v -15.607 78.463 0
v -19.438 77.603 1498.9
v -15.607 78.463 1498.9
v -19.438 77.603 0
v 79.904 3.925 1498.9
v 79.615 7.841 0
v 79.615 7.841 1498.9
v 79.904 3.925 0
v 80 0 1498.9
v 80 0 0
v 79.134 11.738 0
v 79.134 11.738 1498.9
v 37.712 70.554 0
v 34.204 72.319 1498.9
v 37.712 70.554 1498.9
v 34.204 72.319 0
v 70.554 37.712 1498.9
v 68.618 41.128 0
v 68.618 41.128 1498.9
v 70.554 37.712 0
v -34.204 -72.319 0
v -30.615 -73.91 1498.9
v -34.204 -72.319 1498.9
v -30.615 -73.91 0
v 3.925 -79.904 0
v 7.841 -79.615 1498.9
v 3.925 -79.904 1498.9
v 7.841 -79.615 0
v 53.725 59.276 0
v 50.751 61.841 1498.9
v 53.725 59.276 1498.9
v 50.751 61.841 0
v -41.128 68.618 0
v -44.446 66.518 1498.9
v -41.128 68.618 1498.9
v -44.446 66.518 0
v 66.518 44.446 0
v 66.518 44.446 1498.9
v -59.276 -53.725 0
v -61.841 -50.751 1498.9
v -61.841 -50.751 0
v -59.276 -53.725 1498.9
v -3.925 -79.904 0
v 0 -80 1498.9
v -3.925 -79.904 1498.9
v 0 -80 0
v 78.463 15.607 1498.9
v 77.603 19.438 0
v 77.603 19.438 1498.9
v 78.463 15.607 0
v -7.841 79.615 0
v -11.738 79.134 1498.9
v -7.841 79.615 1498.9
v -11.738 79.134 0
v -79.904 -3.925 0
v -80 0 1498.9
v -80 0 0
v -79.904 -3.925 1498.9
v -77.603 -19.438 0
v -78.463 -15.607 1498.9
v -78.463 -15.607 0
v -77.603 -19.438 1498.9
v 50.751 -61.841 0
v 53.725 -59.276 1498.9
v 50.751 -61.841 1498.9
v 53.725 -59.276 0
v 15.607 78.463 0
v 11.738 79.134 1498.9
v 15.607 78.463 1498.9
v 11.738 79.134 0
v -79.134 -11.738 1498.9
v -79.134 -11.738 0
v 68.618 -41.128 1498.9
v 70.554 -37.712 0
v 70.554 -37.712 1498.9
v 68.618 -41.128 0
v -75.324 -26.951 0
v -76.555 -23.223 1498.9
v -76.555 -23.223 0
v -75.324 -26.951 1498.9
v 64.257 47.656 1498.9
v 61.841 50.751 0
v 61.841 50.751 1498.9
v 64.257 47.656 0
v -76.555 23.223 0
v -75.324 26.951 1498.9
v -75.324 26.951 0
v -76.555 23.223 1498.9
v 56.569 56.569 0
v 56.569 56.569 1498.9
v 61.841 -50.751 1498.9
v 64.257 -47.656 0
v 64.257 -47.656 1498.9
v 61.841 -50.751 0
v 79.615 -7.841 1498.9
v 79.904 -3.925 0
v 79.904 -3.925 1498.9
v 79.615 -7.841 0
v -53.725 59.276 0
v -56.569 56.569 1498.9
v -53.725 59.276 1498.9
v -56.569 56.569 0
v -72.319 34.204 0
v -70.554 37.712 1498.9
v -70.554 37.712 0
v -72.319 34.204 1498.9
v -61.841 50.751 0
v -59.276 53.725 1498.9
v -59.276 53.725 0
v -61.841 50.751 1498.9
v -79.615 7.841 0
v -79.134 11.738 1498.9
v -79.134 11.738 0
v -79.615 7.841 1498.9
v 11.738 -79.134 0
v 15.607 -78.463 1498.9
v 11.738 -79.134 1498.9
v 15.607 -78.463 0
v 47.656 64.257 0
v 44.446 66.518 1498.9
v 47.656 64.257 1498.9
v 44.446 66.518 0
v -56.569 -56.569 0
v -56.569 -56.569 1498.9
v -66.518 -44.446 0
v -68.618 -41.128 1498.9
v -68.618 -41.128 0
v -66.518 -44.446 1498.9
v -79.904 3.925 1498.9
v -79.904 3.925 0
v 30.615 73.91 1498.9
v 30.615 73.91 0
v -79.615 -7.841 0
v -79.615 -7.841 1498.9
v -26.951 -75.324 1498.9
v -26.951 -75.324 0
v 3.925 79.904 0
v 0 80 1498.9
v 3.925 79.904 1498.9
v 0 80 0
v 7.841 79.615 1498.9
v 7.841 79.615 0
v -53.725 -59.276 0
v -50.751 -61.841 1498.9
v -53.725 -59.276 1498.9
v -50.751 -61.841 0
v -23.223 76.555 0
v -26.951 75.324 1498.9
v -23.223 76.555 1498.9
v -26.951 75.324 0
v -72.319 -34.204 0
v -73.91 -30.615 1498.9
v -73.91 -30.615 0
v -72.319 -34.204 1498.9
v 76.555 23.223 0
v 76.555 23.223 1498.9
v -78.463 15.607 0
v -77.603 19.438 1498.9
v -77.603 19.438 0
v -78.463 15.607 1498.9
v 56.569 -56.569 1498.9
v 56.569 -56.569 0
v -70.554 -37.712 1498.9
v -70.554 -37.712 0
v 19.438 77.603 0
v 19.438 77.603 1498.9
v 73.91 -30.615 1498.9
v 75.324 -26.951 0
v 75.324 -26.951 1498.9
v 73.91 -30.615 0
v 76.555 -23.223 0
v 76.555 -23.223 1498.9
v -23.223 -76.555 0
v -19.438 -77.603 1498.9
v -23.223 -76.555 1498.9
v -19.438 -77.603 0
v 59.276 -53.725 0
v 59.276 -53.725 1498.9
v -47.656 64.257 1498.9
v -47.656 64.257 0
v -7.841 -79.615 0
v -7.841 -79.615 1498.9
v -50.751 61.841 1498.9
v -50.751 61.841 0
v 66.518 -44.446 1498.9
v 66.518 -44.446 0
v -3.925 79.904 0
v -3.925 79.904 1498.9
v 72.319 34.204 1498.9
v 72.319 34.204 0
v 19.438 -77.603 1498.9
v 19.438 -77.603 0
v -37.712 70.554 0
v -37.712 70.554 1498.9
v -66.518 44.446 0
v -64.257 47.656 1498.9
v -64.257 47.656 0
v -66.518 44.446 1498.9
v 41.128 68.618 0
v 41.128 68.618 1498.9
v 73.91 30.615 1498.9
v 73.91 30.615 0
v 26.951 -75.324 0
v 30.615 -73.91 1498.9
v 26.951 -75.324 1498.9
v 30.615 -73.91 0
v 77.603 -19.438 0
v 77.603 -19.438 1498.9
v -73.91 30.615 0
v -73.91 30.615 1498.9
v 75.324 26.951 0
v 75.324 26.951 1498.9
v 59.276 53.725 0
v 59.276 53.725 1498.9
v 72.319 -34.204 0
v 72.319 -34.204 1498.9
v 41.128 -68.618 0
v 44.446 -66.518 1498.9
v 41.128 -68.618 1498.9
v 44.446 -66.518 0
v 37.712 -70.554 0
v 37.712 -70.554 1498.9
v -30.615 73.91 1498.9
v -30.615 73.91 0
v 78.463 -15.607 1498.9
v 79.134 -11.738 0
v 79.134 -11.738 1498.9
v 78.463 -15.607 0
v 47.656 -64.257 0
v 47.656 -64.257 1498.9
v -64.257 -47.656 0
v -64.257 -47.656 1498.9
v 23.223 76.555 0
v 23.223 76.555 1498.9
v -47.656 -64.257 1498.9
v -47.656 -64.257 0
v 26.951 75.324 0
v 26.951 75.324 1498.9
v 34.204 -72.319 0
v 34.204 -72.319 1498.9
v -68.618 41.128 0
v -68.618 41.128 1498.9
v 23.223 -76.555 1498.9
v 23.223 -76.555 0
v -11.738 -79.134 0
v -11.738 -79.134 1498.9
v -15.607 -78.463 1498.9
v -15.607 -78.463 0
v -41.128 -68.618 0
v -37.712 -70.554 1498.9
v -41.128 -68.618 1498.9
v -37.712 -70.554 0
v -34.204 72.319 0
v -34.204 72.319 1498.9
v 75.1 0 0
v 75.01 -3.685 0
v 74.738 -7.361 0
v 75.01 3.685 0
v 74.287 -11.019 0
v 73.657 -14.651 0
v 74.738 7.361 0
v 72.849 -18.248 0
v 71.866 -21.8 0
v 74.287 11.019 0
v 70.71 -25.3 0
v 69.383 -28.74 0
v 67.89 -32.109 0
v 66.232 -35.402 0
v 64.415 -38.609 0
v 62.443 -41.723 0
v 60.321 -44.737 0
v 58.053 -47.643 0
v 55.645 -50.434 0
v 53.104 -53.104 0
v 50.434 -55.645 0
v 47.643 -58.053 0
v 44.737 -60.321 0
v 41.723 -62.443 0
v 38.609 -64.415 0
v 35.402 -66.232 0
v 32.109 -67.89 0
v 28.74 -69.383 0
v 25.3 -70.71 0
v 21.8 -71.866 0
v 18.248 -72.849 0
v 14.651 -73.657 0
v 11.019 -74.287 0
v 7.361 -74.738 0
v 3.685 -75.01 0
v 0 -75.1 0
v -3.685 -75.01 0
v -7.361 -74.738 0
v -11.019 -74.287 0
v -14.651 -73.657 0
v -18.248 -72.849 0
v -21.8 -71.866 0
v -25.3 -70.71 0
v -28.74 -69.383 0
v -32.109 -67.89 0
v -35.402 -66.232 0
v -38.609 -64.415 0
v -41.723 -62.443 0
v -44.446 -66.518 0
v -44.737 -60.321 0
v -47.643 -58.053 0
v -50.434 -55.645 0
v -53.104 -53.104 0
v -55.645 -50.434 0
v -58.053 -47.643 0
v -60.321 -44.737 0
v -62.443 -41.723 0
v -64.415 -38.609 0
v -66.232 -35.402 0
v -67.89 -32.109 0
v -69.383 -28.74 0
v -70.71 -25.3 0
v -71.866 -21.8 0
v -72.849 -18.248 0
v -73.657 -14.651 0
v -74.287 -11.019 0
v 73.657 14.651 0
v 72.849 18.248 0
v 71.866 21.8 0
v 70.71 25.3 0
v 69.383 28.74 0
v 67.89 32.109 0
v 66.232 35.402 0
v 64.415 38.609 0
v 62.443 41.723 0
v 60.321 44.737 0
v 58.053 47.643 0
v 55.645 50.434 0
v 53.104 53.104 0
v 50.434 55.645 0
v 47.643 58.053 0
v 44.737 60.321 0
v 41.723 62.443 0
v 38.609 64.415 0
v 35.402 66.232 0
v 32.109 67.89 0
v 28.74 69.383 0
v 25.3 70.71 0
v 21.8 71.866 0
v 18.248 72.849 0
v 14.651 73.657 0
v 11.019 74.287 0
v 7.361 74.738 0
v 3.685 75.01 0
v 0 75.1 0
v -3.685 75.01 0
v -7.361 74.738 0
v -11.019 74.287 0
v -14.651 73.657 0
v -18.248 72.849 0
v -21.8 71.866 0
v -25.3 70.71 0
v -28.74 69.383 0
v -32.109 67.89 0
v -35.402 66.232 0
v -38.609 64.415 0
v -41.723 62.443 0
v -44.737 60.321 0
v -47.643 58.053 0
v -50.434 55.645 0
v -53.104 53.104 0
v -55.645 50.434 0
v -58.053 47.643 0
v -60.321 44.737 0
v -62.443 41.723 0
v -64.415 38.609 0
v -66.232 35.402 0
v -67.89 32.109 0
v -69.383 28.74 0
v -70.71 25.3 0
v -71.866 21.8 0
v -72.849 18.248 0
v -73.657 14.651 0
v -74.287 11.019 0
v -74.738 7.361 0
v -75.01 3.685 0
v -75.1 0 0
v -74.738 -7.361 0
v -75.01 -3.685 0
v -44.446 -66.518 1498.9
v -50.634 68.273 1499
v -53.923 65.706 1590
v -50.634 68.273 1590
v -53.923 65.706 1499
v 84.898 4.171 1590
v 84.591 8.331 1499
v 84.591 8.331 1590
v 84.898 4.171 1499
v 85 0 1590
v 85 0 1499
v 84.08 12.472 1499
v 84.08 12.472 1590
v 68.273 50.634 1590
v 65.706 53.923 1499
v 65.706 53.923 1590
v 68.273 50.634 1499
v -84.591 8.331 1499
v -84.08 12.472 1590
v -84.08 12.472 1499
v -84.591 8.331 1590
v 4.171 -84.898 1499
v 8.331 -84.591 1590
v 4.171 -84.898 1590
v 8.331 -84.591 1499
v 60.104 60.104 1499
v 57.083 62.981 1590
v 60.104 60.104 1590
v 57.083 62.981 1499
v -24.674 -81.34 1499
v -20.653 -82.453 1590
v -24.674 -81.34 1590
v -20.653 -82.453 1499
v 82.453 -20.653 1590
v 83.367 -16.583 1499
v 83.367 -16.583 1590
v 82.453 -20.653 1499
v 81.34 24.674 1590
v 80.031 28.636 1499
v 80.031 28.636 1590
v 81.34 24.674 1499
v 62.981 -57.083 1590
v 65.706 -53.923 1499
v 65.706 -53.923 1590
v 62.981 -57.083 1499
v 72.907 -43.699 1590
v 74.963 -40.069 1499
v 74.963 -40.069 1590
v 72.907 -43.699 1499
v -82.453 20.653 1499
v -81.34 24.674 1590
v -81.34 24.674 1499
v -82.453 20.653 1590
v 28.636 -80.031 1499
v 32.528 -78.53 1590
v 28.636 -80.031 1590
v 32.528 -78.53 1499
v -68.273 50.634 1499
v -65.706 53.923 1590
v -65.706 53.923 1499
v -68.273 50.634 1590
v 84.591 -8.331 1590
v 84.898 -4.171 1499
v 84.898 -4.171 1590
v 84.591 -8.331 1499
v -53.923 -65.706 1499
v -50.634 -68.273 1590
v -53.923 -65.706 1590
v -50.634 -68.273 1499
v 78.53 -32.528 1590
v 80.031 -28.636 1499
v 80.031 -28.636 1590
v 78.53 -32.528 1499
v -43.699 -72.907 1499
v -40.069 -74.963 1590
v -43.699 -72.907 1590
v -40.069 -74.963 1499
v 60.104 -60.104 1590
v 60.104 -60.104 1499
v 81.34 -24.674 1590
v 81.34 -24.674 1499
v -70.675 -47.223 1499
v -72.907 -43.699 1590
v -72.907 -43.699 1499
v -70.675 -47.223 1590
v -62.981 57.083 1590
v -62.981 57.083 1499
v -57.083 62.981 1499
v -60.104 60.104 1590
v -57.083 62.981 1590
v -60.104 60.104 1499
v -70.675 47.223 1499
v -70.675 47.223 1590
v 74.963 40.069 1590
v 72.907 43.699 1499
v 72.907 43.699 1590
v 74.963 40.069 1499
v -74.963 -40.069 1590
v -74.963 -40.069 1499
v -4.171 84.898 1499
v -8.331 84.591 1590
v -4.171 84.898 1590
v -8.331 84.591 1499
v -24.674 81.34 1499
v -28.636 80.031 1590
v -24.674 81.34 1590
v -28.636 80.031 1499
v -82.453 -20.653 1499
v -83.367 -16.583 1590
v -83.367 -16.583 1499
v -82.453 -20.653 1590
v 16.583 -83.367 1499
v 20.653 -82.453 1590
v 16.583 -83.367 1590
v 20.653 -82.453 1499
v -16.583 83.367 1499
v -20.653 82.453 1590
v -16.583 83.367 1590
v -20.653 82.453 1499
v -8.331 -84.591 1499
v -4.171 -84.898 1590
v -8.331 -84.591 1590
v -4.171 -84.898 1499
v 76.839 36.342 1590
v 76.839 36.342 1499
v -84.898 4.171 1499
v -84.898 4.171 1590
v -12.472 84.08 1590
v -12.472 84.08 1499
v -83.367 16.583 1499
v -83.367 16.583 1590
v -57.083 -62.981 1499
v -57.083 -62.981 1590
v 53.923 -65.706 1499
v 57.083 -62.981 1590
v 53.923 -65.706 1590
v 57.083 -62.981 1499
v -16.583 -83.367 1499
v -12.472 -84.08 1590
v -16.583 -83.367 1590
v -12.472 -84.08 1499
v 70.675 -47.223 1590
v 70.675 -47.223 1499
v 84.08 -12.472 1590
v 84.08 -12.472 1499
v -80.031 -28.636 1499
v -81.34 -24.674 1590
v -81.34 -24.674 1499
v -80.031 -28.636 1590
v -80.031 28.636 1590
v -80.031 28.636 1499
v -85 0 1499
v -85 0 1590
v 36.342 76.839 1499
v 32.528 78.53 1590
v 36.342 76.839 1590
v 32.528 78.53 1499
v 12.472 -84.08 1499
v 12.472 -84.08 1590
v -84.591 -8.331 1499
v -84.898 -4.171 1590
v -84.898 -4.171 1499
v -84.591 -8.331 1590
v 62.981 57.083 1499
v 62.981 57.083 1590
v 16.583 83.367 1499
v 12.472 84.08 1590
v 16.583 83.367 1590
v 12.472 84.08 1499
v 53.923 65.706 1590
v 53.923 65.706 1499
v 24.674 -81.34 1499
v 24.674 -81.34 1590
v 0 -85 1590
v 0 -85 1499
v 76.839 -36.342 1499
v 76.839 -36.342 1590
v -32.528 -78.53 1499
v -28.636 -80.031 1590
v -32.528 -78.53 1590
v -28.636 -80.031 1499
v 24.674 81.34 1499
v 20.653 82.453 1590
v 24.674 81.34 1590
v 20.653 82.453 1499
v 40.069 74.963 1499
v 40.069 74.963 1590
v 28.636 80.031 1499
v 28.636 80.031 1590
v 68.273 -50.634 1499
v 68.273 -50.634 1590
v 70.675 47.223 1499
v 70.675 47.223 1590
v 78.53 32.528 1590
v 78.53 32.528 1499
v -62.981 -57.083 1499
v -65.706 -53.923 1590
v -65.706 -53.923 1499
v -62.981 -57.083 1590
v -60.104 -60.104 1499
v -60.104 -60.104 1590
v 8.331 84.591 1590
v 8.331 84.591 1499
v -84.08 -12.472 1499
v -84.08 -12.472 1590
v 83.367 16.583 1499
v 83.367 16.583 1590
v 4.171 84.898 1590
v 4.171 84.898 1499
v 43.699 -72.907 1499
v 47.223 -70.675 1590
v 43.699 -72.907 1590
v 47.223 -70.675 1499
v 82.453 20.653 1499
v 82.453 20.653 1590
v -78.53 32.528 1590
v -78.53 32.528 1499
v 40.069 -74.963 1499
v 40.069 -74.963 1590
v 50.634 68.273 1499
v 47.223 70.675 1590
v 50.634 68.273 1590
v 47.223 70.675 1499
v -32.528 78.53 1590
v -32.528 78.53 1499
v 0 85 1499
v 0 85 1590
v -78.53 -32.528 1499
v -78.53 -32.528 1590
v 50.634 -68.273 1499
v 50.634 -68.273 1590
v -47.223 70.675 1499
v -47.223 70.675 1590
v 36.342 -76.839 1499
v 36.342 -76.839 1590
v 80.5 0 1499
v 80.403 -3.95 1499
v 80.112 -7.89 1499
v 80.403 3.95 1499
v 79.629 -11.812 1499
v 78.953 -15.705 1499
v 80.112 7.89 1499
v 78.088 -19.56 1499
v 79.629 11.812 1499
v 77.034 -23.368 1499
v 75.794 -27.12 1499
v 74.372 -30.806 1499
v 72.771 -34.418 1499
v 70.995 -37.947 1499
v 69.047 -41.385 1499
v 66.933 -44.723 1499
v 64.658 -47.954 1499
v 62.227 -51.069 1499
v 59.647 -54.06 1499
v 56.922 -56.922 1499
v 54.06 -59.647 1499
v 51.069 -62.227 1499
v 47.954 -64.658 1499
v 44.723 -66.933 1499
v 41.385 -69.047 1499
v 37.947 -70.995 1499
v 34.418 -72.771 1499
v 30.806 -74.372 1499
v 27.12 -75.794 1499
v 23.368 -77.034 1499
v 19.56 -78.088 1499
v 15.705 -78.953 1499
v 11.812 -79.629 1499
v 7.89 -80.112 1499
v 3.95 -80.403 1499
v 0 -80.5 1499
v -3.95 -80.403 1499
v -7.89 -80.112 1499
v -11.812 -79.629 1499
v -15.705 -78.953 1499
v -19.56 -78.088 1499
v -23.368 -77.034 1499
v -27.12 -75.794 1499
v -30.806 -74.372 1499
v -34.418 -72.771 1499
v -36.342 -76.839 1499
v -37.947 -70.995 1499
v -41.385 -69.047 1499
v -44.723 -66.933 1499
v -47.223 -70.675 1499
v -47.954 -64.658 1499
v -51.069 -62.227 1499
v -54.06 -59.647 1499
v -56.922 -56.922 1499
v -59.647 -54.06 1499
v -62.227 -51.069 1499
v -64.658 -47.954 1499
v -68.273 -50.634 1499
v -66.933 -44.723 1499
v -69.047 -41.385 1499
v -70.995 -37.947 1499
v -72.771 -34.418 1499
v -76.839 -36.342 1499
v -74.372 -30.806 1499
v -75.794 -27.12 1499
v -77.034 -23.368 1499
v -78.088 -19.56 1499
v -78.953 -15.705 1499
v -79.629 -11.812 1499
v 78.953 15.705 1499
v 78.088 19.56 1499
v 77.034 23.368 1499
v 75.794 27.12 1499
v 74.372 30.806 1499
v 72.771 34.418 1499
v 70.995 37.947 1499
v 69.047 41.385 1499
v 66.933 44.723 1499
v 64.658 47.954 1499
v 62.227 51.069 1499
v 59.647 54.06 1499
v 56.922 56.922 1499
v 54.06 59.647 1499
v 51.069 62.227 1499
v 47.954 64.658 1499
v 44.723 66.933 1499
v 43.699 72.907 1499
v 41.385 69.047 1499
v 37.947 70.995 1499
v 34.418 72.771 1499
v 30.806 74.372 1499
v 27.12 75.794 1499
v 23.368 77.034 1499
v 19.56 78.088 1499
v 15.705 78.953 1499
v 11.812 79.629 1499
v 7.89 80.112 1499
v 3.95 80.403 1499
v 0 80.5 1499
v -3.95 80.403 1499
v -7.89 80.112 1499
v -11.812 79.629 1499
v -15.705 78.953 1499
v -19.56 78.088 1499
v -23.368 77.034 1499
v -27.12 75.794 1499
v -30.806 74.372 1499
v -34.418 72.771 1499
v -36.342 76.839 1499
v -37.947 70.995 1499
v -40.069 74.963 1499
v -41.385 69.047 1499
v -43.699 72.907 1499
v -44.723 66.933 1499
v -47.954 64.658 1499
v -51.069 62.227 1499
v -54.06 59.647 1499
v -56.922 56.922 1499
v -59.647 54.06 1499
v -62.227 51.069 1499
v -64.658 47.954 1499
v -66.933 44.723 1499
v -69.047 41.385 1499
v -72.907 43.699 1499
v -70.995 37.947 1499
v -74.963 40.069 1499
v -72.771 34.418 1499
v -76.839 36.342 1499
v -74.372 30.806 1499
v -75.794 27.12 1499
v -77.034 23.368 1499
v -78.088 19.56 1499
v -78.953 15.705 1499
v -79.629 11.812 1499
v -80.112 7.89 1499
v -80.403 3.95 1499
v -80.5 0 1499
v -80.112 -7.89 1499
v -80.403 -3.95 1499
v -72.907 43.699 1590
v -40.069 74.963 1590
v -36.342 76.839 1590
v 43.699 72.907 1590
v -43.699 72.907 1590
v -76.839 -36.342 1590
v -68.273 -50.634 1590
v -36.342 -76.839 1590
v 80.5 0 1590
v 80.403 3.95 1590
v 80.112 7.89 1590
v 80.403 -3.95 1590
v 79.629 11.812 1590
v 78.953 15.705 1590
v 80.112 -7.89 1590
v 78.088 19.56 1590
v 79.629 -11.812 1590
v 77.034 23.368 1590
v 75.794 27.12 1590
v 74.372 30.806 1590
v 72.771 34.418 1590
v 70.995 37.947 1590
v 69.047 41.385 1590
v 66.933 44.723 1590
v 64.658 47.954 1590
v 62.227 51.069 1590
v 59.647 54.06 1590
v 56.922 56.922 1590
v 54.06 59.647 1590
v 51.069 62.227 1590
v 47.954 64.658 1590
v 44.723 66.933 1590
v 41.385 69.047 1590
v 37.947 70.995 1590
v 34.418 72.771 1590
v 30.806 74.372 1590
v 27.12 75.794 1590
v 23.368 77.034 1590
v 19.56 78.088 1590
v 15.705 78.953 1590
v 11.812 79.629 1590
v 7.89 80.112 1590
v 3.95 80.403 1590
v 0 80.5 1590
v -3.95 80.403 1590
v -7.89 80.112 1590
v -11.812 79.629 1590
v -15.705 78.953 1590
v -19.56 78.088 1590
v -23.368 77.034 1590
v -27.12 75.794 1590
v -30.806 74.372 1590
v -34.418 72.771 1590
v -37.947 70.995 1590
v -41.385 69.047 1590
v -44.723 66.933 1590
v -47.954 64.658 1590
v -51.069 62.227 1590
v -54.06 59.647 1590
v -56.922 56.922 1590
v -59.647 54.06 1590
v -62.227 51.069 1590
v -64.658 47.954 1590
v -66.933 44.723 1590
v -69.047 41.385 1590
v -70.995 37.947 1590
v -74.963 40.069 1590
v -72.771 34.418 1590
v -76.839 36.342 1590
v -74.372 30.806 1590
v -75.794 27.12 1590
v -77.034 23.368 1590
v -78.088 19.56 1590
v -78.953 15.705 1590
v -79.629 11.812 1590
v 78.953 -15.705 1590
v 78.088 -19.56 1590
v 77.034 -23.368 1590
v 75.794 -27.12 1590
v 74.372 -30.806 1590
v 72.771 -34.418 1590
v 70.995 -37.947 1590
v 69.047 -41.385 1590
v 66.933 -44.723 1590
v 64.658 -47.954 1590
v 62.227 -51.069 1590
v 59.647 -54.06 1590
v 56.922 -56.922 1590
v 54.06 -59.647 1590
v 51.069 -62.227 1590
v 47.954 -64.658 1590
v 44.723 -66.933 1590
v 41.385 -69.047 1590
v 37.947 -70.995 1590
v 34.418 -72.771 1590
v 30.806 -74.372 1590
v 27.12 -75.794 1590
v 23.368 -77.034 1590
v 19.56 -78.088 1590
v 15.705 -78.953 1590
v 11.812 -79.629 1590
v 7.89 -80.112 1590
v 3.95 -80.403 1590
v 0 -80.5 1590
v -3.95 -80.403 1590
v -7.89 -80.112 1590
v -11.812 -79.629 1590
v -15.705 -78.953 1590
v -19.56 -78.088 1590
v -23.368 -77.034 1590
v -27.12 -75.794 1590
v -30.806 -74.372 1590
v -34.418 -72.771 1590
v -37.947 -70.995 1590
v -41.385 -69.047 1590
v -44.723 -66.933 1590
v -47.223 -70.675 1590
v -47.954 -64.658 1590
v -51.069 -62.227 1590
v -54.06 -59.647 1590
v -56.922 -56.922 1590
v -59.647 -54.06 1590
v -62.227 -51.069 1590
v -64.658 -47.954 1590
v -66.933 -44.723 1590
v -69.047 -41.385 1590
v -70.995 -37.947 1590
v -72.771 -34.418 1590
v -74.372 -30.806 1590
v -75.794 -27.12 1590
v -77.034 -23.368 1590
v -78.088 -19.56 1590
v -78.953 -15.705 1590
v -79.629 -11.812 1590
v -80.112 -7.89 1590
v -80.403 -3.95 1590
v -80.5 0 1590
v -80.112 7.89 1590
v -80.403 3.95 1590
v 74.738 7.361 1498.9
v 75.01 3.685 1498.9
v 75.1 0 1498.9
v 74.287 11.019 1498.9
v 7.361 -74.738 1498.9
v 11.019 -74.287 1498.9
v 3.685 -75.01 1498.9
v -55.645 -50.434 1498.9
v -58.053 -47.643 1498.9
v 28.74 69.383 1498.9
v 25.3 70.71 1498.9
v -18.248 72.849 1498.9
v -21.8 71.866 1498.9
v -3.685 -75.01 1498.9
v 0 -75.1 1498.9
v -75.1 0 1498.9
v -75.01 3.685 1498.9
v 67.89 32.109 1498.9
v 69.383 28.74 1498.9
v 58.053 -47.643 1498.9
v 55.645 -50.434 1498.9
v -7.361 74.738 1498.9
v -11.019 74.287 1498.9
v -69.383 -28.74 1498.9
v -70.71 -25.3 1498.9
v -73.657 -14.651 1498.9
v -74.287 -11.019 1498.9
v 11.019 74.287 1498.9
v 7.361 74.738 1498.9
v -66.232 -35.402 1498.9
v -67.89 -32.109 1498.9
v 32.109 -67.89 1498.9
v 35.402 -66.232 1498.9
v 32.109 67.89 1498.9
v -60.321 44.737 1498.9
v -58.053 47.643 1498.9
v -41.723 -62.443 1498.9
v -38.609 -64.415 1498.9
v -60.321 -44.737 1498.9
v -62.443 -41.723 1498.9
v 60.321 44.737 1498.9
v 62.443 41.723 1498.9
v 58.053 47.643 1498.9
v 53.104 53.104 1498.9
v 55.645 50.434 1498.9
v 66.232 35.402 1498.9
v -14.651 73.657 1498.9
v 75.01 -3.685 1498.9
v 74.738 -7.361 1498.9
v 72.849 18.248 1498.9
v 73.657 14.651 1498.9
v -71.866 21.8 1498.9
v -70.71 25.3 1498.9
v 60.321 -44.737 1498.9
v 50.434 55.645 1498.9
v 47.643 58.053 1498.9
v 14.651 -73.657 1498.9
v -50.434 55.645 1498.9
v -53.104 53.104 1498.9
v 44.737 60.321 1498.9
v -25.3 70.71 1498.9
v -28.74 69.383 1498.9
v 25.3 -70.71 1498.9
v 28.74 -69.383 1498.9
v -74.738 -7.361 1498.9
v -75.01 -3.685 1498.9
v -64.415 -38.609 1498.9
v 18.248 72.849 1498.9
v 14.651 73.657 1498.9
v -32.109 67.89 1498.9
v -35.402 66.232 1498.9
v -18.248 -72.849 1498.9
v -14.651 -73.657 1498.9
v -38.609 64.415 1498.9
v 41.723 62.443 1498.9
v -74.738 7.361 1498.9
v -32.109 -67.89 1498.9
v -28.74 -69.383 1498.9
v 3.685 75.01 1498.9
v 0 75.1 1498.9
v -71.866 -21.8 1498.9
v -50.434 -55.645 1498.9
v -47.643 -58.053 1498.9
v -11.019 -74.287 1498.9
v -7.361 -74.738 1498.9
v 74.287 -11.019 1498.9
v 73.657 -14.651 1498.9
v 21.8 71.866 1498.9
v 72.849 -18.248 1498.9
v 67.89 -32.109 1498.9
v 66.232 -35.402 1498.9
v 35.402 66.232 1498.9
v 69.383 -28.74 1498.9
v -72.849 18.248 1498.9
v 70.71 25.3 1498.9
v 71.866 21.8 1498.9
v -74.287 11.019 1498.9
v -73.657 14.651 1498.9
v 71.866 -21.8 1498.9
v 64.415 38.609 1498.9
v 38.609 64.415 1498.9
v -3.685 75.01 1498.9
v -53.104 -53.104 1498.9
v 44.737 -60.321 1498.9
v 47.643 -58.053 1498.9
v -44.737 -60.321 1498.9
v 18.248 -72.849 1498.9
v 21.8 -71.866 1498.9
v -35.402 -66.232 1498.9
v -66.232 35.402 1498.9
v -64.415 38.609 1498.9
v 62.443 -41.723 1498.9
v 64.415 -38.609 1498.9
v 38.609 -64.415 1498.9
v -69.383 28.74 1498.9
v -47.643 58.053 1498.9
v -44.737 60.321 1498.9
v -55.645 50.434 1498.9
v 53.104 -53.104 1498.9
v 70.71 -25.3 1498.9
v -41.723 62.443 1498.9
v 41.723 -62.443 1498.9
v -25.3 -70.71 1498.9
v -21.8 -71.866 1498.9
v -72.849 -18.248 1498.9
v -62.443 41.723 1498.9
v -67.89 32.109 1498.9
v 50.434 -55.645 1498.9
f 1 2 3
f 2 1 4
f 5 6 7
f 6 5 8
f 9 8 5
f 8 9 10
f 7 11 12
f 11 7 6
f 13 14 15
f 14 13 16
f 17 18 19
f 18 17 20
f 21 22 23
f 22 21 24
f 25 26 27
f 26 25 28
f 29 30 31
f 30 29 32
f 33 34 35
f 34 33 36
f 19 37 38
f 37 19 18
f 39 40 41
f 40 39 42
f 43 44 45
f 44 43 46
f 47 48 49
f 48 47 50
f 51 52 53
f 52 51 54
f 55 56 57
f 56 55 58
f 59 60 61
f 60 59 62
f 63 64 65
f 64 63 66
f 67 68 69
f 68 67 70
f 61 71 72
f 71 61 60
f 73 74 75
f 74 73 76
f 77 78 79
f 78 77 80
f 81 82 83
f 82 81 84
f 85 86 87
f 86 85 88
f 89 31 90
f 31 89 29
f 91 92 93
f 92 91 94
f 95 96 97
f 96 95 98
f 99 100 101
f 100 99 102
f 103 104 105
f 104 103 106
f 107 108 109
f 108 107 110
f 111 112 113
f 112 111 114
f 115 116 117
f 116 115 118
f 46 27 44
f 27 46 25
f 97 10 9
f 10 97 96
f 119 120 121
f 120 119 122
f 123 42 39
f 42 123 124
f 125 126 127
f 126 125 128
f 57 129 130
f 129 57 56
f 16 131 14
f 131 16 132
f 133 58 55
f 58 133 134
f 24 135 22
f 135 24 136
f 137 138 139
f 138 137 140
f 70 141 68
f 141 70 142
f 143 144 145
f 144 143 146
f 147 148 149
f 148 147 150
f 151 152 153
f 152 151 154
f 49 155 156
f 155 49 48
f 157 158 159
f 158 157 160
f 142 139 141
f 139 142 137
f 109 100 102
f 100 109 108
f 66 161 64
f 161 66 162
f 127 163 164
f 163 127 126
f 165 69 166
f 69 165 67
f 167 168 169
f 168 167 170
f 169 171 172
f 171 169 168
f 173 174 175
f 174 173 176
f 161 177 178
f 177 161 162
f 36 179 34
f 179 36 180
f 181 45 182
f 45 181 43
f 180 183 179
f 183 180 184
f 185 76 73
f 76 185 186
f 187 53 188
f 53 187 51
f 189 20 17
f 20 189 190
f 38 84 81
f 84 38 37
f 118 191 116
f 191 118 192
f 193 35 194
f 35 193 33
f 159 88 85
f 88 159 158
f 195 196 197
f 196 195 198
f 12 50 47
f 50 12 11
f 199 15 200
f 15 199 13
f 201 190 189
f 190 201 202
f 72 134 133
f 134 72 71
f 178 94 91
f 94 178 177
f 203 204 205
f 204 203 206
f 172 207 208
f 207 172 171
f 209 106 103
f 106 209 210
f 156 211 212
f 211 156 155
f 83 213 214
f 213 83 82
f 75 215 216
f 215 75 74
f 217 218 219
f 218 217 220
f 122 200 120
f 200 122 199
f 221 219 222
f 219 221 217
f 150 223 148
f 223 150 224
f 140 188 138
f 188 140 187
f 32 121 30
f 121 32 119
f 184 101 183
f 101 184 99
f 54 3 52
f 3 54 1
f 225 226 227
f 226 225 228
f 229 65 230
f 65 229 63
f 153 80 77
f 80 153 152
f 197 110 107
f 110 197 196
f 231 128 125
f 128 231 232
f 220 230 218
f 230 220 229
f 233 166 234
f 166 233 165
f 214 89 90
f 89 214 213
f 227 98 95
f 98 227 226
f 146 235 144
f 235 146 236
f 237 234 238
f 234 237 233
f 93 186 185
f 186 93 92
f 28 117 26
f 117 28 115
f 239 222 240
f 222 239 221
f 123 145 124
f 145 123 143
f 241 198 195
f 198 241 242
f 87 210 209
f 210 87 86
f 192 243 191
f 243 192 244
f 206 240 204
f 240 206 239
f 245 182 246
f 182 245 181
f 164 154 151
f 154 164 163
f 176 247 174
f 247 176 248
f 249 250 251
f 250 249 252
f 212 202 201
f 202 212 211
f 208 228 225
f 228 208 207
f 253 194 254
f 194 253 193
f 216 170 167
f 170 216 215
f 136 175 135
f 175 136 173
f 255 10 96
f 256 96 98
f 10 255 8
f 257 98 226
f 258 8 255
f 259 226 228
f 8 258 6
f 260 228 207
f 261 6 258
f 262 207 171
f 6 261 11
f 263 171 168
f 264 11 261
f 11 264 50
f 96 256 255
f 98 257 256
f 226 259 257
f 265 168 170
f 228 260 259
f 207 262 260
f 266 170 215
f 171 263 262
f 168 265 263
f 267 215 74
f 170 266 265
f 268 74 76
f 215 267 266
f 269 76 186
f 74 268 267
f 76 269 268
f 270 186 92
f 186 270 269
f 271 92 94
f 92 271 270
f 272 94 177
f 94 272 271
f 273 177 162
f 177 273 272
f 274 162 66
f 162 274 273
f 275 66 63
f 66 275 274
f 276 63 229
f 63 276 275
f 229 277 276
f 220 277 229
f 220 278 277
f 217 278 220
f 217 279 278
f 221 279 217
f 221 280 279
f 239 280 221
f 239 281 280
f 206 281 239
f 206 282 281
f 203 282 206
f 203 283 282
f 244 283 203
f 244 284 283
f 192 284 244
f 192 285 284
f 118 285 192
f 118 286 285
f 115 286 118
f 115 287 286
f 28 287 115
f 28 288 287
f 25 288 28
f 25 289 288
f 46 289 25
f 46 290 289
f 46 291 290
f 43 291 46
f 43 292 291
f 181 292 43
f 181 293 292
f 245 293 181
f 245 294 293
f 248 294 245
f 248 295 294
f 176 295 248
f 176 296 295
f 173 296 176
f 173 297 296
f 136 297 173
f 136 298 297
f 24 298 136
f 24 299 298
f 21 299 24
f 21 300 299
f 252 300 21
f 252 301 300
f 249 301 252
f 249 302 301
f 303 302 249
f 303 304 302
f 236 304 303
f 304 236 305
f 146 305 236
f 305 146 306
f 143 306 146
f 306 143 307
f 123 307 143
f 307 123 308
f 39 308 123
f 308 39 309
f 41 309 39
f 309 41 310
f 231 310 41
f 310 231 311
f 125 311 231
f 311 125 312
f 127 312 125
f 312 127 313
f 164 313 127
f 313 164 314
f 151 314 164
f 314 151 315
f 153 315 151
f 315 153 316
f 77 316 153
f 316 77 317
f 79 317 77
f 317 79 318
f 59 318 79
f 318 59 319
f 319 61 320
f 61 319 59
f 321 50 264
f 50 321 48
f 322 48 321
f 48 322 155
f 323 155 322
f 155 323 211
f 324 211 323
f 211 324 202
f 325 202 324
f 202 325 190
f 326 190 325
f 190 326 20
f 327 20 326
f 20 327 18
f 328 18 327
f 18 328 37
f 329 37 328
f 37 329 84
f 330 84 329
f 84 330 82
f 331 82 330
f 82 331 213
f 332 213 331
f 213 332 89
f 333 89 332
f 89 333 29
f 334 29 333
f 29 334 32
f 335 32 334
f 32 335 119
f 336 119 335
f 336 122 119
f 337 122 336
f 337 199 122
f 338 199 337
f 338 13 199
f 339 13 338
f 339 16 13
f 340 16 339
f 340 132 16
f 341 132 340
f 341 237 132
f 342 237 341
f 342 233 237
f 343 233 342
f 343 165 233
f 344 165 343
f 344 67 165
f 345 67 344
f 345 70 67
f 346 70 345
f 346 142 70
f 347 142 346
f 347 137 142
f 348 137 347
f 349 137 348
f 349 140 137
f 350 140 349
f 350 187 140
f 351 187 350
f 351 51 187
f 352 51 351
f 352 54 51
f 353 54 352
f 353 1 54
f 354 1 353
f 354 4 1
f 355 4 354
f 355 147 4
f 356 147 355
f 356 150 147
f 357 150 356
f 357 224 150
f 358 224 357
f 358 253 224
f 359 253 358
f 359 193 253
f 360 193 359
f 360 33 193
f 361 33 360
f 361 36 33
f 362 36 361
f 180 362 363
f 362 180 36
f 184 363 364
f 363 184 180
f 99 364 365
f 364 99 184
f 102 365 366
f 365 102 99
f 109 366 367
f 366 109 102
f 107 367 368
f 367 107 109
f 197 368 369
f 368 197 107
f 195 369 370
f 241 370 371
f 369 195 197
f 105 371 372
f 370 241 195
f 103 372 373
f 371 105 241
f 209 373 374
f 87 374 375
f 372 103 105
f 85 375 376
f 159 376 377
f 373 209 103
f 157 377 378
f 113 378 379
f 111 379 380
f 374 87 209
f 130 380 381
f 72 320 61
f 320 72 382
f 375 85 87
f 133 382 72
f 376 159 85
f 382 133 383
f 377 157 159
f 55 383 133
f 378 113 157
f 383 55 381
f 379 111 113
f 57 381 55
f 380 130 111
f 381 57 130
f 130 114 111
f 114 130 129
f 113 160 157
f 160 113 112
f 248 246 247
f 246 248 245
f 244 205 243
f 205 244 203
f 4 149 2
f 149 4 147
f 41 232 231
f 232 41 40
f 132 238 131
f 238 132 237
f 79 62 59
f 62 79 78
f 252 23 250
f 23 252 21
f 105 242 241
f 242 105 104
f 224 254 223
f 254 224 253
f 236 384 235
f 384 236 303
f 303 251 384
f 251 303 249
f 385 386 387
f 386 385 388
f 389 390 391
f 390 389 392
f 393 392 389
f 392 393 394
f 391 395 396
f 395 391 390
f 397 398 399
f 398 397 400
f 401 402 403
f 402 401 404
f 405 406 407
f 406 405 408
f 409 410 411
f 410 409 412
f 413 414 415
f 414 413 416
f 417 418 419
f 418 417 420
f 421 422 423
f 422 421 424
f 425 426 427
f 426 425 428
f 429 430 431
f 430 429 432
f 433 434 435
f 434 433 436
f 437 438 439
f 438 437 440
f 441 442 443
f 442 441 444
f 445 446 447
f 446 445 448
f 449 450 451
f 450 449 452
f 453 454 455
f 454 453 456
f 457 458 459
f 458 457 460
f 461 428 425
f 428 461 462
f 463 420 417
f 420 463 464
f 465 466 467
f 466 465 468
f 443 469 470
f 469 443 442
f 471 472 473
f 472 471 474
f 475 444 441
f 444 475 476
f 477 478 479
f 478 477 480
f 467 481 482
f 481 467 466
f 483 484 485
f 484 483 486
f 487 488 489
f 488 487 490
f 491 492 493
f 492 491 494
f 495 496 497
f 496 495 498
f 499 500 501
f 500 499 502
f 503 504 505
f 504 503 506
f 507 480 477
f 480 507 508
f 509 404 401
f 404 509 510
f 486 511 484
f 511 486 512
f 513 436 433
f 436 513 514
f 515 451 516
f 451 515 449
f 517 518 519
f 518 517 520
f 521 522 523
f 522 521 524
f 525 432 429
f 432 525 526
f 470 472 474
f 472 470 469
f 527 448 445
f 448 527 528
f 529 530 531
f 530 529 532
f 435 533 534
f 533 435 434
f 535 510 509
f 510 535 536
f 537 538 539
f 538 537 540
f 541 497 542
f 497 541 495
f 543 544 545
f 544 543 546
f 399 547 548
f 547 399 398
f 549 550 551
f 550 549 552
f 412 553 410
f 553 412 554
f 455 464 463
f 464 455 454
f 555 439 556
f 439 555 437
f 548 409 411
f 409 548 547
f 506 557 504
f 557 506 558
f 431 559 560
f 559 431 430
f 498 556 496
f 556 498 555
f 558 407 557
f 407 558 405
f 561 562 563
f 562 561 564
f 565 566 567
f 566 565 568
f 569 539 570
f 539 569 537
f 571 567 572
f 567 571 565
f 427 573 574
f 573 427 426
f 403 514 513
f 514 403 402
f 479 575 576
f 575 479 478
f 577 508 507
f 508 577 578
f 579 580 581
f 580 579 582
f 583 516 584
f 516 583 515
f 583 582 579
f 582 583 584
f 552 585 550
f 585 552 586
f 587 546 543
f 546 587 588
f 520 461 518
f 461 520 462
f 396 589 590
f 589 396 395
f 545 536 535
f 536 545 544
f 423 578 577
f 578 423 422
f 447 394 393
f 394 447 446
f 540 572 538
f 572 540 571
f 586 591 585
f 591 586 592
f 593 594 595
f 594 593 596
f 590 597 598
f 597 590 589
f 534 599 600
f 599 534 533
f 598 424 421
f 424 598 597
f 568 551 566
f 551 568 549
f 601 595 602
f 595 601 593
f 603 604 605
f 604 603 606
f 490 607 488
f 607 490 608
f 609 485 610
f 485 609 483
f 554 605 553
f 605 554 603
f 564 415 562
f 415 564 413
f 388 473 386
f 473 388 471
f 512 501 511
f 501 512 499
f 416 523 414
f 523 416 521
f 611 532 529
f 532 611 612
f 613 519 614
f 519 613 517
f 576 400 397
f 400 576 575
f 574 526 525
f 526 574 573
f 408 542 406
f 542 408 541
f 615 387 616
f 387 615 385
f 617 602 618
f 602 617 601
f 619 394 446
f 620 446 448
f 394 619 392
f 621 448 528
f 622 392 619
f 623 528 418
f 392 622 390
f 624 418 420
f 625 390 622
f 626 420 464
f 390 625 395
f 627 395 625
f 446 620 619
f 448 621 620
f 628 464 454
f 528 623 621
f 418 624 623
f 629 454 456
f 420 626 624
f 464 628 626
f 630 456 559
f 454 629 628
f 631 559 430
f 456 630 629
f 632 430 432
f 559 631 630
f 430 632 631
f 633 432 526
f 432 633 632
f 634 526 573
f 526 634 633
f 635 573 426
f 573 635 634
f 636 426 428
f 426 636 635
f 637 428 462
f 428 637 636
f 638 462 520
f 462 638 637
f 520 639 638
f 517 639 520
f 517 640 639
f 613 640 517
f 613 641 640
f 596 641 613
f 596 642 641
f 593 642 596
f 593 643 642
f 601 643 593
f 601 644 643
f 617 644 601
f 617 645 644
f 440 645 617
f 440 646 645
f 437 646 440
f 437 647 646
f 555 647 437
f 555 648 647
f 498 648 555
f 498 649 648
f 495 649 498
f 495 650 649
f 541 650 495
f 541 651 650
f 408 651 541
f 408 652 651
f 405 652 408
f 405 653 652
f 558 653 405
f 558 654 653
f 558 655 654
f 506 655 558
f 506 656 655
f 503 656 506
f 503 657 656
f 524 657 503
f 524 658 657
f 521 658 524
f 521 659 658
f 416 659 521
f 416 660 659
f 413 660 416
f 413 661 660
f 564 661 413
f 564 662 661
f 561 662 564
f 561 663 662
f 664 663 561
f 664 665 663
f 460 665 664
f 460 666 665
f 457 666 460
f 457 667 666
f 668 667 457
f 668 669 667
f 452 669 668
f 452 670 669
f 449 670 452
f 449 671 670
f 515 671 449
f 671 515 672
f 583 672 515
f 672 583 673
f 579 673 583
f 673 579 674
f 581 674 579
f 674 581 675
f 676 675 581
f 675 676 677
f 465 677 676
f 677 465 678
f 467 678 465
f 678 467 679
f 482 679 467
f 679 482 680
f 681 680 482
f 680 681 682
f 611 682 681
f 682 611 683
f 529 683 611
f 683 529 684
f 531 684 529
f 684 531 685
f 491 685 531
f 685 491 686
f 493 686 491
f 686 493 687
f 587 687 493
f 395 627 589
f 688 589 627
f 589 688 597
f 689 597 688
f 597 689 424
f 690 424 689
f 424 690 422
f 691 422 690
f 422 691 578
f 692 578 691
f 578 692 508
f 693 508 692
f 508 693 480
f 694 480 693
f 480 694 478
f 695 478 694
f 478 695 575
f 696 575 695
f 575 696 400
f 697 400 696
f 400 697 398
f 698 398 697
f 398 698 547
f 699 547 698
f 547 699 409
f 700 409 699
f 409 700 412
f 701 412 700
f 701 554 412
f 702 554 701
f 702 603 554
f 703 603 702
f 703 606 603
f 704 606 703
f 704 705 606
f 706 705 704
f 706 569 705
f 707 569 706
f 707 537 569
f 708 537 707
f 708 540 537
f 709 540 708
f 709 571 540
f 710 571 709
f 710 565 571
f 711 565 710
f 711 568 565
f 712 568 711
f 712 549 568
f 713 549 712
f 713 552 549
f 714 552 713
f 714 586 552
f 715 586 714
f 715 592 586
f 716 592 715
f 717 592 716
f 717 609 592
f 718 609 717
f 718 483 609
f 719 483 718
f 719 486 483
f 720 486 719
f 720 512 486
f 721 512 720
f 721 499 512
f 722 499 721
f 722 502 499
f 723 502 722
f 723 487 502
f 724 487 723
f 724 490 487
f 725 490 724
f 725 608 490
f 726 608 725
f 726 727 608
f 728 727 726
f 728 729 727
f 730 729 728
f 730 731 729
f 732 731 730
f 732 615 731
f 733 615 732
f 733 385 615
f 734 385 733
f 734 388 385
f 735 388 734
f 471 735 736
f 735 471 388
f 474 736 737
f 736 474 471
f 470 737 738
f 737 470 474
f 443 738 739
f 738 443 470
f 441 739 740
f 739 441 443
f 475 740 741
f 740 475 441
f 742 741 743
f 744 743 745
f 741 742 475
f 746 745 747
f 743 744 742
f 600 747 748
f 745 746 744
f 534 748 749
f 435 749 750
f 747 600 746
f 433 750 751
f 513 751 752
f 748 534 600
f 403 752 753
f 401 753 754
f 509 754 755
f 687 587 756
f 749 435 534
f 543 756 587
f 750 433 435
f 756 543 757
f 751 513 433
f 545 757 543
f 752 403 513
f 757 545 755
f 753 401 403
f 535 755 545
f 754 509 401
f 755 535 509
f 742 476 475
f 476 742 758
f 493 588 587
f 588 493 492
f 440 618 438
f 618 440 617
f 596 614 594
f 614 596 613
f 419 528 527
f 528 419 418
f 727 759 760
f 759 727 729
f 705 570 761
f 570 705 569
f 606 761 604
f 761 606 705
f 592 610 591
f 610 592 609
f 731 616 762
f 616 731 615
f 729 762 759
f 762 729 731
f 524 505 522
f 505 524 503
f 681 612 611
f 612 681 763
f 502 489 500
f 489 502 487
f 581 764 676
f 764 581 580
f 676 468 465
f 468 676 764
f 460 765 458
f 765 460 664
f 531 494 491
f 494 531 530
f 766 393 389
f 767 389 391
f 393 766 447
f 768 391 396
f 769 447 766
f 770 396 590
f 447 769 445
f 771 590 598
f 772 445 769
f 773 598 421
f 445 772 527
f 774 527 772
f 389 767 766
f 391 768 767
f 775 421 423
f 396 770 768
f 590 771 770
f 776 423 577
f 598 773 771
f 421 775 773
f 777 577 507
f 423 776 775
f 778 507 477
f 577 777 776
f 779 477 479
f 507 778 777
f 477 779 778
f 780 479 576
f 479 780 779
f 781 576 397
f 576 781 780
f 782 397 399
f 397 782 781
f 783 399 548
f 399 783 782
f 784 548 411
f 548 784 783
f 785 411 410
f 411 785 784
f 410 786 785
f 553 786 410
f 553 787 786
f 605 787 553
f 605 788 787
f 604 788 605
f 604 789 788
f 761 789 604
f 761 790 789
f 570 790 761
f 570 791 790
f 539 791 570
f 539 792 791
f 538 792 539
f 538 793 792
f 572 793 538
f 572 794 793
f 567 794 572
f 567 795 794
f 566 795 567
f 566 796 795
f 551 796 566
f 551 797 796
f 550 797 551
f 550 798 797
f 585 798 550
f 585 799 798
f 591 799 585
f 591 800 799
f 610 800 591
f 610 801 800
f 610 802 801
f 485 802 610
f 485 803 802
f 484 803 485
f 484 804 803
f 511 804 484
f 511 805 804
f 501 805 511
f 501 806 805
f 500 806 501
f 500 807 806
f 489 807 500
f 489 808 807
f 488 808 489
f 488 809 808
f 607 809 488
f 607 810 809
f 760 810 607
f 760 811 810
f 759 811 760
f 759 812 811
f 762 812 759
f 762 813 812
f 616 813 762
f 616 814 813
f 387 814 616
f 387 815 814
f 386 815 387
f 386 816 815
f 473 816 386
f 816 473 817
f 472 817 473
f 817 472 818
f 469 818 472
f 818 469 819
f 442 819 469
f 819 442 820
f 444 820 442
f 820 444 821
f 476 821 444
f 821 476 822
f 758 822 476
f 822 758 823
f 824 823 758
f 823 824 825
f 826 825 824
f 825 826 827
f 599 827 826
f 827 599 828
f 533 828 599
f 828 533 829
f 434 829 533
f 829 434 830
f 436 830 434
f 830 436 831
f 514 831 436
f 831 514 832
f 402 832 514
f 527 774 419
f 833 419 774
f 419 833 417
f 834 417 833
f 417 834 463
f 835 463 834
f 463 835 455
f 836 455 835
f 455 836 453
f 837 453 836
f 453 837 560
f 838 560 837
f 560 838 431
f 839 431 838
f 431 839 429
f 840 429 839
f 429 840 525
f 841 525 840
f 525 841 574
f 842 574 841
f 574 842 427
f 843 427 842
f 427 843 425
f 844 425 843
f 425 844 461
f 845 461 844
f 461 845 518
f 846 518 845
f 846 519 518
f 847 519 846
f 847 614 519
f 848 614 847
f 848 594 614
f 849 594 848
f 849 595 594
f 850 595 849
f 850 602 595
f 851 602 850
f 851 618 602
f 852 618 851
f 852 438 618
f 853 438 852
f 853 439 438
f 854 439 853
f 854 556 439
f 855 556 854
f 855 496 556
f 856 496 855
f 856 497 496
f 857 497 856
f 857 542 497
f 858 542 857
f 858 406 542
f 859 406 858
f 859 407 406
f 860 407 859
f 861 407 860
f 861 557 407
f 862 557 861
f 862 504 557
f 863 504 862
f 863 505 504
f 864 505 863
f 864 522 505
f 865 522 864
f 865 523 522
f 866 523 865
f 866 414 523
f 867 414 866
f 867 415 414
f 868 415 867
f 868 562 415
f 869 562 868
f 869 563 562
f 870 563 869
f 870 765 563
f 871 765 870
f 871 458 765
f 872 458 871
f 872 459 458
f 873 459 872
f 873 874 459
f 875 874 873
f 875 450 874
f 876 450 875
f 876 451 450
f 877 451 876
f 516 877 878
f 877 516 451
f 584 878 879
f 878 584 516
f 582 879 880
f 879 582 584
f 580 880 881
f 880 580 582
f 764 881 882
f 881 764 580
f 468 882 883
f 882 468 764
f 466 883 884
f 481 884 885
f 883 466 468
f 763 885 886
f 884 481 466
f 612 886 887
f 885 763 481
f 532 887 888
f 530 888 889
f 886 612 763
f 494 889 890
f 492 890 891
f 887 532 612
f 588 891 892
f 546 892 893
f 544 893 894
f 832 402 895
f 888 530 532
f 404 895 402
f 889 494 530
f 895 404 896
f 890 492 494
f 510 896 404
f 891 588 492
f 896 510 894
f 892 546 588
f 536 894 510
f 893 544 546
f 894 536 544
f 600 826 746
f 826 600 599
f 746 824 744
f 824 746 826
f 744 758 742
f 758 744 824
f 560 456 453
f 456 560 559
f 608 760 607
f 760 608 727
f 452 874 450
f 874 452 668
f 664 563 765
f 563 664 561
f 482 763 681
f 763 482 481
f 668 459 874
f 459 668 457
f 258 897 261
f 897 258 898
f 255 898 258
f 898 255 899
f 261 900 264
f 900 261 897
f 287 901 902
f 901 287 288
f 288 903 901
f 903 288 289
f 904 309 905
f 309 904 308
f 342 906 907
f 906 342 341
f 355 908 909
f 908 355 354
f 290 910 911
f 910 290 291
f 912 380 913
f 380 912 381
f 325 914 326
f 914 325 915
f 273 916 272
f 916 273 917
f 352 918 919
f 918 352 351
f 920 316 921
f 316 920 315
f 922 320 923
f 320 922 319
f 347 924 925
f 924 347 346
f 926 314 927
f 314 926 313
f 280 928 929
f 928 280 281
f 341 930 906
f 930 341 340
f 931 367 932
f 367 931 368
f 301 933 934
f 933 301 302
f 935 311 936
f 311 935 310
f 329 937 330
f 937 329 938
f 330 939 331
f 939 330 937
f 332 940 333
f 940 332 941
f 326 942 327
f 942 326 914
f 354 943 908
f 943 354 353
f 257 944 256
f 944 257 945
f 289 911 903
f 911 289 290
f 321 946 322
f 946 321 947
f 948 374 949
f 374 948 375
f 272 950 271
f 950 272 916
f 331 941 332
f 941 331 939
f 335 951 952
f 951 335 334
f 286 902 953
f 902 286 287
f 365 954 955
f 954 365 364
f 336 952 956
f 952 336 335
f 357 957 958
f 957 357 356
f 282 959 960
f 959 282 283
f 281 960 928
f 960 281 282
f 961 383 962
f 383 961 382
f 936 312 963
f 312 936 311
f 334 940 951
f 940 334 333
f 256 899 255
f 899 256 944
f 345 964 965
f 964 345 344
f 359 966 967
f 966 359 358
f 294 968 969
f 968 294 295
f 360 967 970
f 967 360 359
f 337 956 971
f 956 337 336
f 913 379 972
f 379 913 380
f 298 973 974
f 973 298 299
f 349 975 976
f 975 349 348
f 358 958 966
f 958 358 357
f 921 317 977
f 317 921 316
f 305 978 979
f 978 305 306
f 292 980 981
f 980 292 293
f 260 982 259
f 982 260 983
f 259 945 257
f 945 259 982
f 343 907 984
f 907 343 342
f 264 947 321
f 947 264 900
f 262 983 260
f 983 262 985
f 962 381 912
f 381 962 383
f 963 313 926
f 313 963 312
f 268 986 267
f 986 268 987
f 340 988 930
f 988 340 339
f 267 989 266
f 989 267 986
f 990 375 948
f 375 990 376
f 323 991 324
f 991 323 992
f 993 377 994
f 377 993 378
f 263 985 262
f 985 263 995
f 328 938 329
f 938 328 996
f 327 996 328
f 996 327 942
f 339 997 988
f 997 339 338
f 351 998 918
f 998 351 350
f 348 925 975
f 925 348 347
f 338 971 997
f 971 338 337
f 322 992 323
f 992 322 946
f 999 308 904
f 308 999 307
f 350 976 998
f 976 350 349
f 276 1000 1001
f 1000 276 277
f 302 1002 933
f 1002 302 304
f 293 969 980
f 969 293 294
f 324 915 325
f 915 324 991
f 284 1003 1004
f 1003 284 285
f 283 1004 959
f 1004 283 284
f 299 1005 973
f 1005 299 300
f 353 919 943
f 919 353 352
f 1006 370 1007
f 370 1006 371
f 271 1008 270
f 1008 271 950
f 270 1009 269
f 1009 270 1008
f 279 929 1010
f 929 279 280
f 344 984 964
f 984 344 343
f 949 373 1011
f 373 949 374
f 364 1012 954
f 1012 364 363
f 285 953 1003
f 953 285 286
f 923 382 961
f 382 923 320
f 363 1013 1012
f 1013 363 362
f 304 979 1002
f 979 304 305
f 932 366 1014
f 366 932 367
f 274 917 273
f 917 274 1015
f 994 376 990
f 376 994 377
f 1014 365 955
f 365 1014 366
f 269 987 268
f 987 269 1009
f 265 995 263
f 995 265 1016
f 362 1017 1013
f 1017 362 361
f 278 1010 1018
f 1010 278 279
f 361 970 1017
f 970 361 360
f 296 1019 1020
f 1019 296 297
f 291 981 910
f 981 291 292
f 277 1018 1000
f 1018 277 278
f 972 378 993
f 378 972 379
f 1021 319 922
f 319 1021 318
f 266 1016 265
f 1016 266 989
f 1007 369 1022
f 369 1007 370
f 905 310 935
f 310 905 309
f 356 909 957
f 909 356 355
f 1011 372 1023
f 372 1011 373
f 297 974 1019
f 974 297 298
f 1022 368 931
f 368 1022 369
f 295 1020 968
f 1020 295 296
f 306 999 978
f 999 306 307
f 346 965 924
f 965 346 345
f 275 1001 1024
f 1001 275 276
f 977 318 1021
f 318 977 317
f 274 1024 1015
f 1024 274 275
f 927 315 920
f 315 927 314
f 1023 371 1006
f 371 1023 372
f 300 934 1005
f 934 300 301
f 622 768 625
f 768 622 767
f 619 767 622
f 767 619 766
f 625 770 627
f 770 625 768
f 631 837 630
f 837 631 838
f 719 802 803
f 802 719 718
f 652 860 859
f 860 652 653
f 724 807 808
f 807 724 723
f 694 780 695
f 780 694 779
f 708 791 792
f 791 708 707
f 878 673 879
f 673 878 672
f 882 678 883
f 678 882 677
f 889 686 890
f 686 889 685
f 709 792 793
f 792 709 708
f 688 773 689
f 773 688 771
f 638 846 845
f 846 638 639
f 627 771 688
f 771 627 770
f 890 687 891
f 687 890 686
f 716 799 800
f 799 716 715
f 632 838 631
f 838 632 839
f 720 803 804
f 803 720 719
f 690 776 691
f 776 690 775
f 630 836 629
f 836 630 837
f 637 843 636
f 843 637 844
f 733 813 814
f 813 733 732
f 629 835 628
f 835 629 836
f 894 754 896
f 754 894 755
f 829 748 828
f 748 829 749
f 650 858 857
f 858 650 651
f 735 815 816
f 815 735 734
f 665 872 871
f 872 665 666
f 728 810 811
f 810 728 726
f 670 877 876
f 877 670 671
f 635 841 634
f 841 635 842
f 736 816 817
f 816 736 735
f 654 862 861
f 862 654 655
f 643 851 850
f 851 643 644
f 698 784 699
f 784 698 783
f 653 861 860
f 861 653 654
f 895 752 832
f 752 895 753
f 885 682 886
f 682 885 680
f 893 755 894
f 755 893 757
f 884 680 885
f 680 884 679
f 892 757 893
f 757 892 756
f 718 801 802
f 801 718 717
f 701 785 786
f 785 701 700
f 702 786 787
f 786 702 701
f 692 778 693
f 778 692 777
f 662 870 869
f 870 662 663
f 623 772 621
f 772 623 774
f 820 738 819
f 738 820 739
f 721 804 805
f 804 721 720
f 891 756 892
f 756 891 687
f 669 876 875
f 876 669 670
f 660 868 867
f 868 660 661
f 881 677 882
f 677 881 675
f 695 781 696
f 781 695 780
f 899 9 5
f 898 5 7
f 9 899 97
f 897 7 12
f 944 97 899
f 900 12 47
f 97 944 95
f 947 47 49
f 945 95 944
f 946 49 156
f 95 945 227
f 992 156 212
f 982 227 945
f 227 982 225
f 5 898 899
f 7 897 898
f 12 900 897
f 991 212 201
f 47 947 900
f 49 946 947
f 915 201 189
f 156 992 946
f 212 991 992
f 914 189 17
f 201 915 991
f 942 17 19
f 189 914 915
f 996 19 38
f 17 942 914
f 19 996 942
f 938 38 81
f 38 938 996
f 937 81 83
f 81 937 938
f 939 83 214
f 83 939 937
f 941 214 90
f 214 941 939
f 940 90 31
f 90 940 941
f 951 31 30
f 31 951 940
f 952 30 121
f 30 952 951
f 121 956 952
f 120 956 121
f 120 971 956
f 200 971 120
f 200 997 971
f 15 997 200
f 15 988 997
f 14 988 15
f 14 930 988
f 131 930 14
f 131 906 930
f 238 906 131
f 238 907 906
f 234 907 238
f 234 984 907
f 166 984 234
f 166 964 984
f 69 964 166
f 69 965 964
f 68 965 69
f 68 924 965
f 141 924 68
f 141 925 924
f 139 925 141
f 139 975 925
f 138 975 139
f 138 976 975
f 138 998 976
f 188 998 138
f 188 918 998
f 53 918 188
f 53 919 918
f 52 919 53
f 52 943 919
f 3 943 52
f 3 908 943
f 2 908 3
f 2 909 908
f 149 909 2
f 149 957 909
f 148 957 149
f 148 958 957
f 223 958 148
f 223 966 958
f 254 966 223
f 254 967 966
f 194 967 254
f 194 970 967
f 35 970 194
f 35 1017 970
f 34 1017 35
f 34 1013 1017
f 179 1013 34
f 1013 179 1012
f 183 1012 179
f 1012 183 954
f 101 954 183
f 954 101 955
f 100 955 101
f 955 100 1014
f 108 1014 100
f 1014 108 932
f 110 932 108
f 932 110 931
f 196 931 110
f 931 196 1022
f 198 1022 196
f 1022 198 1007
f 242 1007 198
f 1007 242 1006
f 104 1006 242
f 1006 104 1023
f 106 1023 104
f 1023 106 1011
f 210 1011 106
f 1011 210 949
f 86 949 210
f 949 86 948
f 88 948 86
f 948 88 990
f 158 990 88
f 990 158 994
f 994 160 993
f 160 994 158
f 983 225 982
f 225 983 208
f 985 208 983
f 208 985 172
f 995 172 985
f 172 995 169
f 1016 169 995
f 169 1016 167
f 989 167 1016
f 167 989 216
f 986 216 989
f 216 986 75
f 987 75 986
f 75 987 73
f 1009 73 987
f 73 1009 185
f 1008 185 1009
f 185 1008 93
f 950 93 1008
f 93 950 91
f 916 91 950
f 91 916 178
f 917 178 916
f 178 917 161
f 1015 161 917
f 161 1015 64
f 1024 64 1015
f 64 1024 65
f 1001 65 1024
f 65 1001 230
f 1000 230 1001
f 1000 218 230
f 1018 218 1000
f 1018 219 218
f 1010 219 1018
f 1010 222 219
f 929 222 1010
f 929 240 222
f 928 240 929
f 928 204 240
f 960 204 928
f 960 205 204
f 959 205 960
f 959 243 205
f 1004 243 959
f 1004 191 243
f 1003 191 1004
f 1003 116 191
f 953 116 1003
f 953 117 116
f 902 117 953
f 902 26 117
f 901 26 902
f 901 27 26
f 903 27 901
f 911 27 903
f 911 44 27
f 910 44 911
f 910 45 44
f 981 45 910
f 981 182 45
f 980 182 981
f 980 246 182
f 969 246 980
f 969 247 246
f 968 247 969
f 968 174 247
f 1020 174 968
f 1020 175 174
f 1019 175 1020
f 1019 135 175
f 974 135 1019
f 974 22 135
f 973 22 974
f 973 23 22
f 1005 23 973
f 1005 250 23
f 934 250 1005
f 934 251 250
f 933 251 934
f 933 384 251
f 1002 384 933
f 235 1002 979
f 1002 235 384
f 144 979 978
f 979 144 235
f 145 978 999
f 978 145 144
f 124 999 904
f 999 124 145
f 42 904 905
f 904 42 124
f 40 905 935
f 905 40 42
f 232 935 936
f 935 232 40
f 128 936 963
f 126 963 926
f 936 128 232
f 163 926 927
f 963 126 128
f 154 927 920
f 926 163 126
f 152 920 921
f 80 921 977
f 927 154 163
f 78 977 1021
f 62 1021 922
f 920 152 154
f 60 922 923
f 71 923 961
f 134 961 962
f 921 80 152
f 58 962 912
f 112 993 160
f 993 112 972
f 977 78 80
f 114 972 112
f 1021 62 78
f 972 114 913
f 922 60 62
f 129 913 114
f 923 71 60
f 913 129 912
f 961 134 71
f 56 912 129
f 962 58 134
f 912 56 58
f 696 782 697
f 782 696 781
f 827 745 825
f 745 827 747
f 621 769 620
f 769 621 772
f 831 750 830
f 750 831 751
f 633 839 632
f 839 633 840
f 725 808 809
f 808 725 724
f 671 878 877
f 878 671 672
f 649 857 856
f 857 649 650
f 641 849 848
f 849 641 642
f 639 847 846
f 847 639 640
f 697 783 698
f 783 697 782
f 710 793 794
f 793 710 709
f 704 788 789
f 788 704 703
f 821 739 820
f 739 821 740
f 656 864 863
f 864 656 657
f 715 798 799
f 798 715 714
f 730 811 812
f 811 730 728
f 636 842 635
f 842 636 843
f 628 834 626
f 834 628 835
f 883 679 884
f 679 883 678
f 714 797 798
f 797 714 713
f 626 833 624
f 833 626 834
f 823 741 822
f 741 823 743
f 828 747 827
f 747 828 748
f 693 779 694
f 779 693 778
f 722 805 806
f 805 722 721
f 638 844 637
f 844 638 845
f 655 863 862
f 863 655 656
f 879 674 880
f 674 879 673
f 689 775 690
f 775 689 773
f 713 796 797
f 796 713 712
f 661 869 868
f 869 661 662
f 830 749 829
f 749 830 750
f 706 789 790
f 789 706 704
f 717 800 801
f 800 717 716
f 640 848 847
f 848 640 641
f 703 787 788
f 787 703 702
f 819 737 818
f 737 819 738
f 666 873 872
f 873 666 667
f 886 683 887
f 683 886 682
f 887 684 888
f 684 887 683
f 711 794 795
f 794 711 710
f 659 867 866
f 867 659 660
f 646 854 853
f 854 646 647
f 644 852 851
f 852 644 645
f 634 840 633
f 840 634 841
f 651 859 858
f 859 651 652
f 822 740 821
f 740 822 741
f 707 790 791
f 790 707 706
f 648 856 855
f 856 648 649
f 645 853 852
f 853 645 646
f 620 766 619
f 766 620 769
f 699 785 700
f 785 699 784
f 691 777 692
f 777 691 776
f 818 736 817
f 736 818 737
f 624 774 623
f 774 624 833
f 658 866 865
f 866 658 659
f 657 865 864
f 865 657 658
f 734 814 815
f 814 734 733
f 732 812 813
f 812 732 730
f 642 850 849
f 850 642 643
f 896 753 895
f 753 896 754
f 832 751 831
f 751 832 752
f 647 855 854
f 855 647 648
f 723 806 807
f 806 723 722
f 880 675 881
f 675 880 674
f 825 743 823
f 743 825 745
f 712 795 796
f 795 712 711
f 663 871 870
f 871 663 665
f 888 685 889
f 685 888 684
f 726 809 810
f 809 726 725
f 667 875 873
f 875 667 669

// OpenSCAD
// Parameters
pipe_standard = 0; //[0:0:1]
nominal_diameter_mm = 160; //[80:320:1]
length_mm = 1500; //[750:3000:10]
pipe_od = 160; //[80:320:1]
pipe_wall = 4.9; //[2.5:10:0.1]
socket_length = 90; //[45:180:1]
socket_wall_extra = 2.5; //[1:6:0.1]
socket_od_extra = 10; //[4:25:0.5]
socket_insert_overlap = 1; //[0.5:2:0.1]
inner_clearance = 0.5; //[0.2:1.5:0.1]

$fn = 128;

module ht_pipe() {
  pipe_ro = pipe_od/2;
  pipe_ri = max(0.01, pipe_ro - pipe_wall);

  // Socket outer diameter: allow either explicit OD extra or wall extra (whichever is larger)
  socket_ro_from_od   = pipe_ro + socket_od_extra/2;
  socket_ro_from_wall = pipe_ro + socket_wall_extra;
  socket_ro = max(socket_ro_from_od, socket_ro_from_wall);

  // Socket inner radius: slightly larger than pipe OD to accept insertion
  socket_ri = pipe_ro + inner_clearance;

  // Keep socket wall valid
  socket_ri_eff = min(socket_ri, socket_ro - 0.2);

  // Overlap to guarantee connectivity and avoid coplanar faces
  z_overlap = max(0.5, socket_insert_overlap);

  // Total outer length includes socket
  total_len = length_mm + socket_length;

  color([0.85, 0.85, 0.8])
  difference() {
    // OUTER solid (one connected piece)
    union() {
      // Main pipe outer
      cylinder(h=length_mm, r=pipe_ro, center=false);

      // Socket outer, starts inside main pipe by z_overlap to ensure union connectivity
      translate([0, 0, length_mm - z_overlap])
        cylinder(h=socket_length + z_overlap, r=socket_ro, center=false);
    }

    // INNER void (continuous bore)
    union() {
      // Pipe bore through entire part (ensures open ends)
      translate([0, 0, -0.1])
        cylinder(h=total_len + 0.2, r=pipe_ri, center=false);

      // Socket enlarged bore only in socket region
      translate([0, 0, length_mm - z_overlap - 0.1])
        cylinder(h=socket_length + z_overlap + 0.2, r=socket_ri_eff, center=false);
    }
  }
}

ht_pipe();
